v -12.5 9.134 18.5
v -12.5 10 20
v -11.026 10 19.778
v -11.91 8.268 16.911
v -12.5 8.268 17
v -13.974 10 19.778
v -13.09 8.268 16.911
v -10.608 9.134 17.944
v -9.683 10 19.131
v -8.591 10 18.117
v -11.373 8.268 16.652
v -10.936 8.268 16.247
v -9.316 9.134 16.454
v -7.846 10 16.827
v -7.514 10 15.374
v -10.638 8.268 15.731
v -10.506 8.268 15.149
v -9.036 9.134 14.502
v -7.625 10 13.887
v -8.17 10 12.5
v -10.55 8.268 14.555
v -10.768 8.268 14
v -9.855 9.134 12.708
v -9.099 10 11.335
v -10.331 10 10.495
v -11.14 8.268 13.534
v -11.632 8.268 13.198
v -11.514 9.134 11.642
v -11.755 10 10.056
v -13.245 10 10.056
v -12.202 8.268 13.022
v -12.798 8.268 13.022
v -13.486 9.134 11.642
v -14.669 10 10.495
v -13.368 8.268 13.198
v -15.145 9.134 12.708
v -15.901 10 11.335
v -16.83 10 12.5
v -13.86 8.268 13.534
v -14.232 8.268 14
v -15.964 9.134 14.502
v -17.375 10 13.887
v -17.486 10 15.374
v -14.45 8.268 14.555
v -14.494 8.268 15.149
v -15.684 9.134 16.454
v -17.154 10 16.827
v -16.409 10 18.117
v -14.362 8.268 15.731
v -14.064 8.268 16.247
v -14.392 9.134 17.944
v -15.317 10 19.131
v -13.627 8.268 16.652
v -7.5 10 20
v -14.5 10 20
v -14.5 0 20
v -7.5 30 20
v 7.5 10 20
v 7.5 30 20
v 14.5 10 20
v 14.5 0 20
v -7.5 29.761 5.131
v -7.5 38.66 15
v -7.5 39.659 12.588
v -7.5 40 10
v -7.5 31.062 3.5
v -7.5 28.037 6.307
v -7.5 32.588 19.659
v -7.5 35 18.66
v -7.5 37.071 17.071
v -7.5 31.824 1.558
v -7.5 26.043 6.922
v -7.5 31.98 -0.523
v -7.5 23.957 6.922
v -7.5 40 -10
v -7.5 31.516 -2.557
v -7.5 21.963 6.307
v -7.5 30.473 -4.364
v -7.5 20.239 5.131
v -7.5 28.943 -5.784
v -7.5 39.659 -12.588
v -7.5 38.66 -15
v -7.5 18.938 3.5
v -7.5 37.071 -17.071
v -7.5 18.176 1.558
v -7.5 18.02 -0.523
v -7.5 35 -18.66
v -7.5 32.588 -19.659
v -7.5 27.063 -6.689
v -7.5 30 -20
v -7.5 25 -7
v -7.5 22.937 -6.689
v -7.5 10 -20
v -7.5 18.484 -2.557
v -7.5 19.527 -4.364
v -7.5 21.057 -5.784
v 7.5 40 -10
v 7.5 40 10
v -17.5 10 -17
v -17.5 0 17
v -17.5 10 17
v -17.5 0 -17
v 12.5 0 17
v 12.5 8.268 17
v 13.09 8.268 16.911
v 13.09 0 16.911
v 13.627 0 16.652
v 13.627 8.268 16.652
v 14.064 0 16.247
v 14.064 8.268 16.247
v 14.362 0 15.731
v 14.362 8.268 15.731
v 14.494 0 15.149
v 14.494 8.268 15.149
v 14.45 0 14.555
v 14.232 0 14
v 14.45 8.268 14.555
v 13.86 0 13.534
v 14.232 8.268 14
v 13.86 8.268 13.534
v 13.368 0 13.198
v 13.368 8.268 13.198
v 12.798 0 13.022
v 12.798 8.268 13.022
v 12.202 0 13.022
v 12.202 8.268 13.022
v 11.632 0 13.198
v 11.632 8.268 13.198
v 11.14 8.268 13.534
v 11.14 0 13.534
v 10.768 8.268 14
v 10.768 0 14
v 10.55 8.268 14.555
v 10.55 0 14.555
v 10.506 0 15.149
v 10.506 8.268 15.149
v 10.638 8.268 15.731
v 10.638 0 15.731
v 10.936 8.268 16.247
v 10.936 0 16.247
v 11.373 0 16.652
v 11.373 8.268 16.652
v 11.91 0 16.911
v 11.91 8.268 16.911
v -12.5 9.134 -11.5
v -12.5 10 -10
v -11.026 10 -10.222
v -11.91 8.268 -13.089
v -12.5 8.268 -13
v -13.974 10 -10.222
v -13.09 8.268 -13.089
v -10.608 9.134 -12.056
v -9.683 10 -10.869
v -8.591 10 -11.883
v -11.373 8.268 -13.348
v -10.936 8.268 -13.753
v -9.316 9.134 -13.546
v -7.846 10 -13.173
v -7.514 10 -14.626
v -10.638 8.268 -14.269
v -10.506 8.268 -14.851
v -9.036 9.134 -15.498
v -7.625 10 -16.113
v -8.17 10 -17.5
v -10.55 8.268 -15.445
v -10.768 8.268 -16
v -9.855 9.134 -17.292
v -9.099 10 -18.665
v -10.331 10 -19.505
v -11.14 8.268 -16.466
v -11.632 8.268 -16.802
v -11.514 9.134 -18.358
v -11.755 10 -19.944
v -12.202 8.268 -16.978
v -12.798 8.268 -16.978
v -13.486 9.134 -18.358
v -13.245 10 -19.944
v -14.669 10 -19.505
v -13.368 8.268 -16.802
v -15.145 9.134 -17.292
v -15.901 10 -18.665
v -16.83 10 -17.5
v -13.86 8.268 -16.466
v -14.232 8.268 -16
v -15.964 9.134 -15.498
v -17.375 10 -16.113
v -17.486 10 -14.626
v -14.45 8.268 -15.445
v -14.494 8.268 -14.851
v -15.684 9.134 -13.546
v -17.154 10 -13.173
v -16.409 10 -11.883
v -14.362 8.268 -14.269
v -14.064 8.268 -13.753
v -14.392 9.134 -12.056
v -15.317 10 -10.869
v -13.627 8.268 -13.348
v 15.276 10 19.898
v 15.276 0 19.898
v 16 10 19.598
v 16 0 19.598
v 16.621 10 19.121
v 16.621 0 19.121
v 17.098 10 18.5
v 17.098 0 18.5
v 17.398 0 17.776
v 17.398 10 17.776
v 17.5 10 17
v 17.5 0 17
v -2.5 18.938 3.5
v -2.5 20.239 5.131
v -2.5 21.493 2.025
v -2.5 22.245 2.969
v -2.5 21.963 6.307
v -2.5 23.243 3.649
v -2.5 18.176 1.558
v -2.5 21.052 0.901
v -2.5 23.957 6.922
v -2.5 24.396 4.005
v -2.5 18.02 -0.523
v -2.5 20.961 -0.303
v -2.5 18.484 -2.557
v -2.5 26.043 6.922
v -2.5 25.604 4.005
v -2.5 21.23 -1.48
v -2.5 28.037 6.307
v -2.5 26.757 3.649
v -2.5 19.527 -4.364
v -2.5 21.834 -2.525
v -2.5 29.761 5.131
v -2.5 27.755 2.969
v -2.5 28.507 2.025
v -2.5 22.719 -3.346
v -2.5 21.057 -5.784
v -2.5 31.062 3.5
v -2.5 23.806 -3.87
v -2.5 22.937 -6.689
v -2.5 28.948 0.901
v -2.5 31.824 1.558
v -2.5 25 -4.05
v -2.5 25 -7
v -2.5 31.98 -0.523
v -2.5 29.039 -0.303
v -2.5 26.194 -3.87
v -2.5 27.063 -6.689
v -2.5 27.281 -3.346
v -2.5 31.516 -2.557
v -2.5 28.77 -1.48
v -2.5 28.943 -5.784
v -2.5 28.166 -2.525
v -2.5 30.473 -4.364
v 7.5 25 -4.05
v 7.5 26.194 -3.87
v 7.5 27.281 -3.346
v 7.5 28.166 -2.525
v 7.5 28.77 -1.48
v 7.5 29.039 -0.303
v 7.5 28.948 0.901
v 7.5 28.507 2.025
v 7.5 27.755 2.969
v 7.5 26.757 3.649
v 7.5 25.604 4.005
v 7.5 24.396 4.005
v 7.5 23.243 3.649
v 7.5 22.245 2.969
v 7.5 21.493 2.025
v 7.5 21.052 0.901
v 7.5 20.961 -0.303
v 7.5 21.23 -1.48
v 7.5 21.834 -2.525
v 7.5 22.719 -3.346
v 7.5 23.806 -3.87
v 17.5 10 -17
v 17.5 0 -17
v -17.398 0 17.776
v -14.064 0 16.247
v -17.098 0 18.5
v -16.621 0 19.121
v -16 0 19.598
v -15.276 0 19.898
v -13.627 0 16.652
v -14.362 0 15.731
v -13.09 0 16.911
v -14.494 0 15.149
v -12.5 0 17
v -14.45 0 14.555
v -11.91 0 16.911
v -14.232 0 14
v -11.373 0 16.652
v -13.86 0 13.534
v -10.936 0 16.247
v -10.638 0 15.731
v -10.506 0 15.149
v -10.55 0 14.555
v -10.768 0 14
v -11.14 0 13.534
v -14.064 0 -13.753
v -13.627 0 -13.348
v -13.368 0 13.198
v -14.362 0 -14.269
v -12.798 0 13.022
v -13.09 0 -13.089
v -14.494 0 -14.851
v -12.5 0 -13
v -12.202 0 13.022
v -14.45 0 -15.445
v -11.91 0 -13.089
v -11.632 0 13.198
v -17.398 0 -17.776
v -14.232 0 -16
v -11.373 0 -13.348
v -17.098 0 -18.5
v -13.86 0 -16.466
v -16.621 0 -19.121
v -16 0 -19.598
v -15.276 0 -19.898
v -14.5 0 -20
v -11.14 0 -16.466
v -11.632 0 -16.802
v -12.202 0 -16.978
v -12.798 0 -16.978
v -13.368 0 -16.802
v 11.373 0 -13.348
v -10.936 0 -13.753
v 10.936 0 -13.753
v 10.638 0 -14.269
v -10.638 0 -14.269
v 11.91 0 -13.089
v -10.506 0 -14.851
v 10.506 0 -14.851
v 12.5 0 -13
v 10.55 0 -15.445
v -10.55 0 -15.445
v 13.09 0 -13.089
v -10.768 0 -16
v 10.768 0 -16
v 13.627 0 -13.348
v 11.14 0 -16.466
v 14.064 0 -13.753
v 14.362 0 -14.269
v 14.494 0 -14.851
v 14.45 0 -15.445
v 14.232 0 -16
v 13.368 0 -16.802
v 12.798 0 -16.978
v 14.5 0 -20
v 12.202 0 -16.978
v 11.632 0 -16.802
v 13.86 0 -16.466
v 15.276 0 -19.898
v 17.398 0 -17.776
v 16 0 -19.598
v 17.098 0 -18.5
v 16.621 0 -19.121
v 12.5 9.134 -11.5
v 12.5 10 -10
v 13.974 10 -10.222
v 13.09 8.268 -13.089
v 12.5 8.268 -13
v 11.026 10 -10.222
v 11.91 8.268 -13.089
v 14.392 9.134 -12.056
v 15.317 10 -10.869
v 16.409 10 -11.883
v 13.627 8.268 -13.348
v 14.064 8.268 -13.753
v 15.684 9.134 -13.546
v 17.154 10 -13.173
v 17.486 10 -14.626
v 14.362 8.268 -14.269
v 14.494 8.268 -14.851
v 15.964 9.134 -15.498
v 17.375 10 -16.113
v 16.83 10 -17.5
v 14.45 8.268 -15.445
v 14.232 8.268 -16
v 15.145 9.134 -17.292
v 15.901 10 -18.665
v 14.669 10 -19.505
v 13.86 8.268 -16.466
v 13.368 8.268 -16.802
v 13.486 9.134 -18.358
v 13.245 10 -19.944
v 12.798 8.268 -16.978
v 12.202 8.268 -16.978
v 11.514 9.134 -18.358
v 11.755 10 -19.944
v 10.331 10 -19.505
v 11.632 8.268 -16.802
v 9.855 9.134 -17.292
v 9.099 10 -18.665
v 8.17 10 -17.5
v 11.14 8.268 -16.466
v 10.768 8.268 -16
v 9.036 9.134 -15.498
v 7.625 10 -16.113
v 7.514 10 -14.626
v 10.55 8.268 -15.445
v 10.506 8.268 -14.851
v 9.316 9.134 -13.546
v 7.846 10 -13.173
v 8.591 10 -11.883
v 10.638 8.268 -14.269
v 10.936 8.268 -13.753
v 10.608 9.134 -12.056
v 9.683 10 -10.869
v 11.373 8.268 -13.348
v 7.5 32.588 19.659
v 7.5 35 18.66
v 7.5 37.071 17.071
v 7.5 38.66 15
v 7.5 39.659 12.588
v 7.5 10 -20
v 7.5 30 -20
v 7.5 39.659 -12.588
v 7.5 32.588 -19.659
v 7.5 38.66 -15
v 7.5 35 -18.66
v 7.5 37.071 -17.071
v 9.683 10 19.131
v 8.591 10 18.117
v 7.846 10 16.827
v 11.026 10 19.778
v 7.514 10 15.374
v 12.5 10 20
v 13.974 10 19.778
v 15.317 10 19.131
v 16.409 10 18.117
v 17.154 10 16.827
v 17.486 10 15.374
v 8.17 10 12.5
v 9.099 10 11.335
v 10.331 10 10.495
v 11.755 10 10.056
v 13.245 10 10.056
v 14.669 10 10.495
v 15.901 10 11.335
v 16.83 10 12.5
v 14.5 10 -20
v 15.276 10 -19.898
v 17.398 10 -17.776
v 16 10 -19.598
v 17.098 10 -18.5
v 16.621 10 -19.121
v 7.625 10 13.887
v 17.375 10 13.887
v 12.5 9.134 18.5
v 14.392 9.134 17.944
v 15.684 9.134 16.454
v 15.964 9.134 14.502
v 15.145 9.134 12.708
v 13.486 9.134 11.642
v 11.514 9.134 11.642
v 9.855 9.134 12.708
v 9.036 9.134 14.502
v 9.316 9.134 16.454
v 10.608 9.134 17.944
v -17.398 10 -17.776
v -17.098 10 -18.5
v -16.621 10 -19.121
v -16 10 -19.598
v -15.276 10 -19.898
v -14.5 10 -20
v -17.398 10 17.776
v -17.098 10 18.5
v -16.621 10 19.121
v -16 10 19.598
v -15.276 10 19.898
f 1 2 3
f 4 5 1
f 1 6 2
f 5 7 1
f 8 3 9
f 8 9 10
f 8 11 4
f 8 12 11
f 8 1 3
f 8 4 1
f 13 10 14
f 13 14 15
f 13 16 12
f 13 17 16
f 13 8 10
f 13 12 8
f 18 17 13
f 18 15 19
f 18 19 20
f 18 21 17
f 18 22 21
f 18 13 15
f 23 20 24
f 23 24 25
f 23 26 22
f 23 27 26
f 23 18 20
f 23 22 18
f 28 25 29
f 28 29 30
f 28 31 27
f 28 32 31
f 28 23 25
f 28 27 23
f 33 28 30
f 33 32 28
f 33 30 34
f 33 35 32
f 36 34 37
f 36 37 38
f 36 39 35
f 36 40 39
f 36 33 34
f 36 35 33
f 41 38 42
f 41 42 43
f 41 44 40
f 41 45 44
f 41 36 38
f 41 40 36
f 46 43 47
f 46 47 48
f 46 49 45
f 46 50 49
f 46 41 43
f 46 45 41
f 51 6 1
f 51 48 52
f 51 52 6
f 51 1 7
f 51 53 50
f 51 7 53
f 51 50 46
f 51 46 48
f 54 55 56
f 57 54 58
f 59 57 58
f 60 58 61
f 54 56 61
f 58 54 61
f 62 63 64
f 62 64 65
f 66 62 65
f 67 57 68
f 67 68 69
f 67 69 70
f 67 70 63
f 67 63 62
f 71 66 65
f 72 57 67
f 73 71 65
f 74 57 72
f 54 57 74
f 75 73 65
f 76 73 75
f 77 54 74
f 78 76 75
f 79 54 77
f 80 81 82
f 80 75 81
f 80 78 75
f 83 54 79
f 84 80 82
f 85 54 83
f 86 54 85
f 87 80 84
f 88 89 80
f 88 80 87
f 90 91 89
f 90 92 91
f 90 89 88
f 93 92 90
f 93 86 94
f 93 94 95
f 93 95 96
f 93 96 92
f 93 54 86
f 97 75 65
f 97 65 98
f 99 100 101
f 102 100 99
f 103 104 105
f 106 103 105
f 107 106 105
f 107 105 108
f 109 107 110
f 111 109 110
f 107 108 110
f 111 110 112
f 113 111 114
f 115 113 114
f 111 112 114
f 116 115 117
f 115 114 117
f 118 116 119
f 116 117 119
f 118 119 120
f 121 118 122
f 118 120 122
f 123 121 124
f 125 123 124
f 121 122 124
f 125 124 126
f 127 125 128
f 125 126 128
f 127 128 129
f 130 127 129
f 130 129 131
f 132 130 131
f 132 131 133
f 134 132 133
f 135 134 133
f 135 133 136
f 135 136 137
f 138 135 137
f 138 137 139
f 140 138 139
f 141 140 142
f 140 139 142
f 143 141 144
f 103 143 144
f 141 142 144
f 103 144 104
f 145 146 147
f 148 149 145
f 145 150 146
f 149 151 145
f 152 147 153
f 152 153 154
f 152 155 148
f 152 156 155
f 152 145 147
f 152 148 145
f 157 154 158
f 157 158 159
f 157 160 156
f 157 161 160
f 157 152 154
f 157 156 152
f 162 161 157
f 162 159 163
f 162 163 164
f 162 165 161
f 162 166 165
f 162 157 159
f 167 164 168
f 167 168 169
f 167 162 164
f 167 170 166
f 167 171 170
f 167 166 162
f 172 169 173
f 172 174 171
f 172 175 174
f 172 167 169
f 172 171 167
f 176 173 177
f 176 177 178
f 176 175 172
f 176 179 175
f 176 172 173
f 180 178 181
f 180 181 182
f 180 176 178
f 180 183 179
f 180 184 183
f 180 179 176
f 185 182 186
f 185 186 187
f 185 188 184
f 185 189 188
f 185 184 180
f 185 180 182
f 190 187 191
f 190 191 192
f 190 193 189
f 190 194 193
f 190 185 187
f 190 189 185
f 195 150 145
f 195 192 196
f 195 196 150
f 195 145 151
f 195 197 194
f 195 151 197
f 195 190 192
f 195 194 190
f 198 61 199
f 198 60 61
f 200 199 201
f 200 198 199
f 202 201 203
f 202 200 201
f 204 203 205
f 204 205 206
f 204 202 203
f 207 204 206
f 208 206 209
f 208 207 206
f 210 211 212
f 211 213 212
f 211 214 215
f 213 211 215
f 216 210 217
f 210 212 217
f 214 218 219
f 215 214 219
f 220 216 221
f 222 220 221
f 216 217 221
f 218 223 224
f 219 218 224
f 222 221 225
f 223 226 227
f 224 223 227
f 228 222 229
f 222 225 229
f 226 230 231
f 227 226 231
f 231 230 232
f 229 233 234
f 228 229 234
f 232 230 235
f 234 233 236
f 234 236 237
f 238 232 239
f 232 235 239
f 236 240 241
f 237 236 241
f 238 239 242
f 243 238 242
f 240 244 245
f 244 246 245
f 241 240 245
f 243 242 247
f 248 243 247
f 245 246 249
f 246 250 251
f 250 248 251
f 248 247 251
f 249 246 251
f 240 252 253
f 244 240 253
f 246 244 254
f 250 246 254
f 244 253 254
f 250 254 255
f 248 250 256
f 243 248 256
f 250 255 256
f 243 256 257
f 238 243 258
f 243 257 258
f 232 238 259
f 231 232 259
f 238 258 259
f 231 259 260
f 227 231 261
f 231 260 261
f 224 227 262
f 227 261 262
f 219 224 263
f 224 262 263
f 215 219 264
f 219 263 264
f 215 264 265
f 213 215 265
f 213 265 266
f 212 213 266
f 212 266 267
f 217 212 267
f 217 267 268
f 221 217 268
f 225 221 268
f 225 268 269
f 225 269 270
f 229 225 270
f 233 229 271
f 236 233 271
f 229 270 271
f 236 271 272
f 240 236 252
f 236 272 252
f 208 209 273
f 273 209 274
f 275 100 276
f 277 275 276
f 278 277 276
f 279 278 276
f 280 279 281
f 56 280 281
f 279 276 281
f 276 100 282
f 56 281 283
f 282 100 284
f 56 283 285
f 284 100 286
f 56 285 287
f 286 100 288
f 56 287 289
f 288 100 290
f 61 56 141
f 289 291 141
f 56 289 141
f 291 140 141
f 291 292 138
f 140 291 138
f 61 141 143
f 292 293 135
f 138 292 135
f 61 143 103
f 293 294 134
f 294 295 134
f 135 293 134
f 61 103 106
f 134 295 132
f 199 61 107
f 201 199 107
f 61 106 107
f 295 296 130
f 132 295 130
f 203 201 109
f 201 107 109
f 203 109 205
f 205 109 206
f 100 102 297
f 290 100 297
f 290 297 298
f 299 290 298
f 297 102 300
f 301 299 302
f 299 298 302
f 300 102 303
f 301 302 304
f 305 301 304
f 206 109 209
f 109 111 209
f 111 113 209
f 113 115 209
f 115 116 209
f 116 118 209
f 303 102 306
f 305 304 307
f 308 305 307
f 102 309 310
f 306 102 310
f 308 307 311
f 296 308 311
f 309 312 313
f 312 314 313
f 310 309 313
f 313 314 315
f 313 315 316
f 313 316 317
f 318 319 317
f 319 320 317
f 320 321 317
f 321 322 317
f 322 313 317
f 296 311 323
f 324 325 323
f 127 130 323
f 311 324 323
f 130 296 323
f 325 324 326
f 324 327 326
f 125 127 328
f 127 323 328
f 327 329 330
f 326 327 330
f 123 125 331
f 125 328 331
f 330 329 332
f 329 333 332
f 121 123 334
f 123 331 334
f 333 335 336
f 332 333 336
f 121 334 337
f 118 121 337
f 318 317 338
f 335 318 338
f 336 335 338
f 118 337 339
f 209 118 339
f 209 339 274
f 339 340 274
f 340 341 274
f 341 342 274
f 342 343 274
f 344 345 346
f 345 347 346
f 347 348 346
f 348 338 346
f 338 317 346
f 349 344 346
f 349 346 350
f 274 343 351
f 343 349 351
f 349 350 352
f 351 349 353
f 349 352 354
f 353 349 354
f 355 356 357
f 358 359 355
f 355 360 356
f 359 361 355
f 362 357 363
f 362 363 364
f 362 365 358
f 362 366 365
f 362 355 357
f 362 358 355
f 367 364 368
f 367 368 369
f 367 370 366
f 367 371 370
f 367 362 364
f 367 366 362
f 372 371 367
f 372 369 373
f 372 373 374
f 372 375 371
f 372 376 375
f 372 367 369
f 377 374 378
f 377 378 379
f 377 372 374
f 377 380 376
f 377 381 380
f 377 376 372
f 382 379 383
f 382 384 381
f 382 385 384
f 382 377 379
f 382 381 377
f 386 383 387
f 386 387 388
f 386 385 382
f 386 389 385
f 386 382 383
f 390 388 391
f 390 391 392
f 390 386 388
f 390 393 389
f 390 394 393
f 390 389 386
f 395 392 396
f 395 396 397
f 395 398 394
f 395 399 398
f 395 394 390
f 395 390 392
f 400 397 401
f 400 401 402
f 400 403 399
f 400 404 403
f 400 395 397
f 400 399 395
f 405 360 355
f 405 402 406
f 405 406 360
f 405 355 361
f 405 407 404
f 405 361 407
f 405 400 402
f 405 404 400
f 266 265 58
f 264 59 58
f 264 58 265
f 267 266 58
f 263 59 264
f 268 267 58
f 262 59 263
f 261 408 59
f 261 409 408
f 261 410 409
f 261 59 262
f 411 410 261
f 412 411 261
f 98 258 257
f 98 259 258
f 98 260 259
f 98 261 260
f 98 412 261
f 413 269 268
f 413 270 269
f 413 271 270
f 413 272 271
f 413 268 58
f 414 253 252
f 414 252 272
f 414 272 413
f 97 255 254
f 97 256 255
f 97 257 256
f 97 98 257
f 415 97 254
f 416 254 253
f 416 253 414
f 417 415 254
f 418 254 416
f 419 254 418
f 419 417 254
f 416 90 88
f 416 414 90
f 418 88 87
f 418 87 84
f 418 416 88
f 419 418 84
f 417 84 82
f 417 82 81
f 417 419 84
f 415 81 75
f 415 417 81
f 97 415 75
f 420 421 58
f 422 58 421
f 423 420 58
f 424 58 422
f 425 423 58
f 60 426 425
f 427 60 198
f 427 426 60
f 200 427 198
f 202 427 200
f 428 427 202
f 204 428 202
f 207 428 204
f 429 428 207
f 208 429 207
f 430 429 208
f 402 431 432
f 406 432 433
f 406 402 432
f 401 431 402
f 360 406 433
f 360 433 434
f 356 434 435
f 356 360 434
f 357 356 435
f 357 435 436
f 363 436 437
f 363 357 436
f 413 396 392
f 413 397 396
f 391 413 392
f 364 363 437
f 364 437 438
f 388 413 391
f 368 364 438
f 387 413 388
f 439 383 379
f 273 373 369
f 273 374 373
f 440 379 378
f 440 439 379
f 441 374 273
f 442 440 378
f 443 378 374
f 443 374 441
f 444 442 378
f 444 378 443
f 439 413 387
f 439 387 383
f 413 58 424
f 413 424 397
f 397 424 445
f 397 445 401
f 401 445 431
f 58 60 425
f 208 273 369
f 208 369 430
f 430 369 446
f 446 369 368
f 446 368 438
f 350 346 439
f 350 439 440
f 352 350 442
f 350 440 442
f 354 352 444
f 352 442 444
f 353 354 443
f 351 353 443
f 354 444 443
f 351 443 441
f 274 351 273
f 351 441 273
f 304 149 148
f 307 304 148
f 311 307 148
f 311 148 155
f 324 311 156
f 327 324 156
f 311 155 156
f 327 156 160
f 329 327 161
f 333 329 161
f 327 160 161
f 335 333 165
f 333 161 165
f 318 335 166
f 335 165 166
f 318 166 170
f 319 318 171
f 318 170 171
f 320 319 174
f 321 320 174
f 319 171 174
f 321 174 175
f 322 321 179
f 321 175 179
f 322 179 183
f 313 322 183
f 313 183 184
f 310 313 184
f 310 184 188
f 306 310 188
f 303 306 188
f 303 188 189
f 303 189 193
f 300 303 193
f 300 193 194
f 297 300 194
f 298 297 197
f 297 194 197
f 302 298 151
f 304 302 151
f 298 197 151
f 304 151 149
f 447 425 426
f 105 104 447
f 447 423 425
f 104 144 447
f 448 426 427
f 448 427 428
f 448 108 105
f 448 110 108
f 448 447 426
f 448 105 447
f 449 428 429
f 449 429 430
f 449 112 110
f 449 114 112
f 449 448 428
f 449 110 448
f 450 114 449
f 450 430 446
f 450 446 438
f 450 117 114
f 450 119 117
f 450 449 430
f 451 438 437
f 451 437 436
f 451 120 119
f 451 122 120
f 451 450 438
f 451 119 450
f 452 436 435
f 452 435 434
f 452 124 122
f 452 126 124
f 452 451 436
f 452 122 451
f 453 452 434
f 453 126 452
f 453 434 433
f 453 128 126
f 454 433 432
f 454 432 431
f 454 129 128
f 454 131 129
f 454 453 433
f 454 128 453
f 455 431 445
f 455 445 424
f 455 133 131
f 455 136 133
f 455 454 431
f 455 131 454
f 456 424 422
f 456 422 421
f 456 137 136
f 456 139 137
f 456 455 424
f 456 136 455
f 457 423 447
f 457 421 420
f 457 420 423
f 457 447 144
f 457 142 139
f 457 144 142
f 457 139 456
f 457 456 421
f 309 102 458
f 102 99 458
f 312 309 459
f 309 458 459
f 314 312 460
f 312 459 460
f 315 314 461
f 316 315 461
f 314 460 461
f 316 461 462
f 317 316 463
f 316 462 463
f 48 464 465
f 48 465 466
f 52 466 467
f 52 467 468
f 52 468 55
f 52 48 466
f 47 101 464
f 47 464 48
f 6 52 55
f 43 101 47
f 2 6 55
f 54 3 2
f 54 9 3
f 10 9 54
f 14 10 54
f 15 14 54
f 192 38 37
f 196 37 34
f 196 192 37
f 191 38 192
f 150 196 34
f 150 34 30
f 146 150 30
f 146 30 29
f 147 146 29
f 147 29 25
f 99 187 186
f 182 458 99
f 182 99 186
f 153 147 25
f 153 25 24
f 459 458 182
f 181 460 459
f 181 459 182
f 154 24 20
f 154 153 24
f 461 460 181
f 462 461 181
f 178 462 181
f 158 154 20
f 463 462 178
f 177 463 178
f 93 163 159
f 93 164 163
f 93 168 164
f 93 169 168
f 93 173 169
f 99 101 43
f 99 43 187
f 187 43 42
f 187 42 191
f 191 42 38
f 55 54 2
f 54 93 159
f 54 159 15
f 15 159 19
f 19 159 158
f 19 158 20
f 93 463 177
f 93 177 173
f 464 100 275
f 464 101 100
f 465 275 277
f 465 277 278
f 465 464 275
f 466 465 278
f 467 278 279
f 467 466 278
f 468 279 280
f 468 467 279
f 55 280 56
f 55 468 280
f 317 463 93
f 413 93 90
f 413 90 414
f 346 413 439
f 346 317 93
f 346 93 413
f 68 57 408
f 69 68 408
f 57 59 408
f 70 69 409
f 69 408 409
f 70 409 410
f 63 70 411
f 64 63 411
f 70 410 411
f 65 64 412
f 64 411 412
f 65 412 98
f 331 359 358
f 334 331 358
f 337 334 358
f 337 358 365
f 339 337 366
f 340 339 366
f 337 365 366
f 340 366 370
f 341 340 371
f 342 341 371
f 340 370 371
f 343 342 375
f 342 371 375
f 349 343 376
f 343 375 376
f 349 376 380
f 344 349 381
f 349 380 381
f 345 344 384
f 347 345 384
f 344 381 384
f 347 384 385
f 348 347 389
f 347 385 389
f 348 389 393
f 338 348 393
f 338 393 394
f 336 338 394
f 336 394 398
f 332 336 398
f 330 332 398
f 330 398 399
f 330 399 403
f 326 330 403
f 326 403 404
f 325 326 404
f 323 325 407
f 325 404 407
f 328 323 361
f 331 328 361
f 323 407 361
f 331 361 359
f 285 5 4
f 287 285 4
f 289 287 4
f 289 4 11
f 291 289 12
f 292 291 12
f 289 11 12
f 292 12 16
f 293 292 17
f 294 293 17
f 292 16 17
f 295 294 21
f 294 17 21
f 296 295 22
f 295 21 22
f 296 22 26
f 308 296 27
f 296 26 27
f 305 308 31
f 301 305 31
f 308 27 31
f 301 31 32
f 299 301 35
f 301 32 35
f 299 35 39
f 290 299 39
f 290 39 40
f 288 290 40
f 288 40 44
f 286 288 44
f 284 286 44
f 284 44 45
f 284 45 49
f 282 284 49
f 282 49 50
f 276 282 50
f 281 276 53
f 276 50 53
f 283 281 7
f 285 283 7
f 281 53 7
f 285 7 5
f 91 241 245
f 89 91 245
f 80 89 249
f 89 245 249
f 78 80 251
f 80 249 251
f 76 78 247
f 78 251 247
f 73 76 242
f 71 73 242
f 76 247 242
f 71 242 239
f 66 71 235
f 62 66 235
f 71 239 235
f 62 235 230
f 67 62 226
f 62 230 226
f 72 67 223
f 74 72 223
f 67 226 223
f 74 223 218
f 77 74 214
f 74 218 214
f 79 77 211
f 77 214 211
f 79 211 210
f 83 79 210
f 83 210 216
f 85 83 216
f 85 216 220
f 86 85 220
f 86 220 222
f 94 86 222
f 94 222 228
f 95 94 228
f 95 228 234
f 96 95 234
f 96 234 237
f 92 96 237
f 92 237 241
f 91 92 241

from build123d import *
from OCP.BRepFilletAPI import BRepFilletAPI_MakeChamfer

# Parameters (mm, degrees)
SKETCH_2_W          = 35
SKETCH_2_H          = 40
EXTRUDE_1_DEPTH     = 10
SKETCH_3_R          = 2
CUT_EXTRUDE_2_DEPTH = 10
SKETCH_4_W          = 15
SKETCH_4_H          = 40
EXTRUDE_2_DEPTH     = 30
SKETCH_5_R          = 7
CUT_EXTRUDE_3_DEPTH = 52.23475383
FILLET_2_R          = 3
FILLET_3_R          = 10
CHAMFER_1_SIZE      = 3
CHAMFER_1_SIZE_2    = 1.732050808
SKETCH_6_R          = 7
SKETCH_6_R_2        = 4.05
EXTRUDE_3_DEPTH     = 10


with BuildPart() as part:
    # 草图2 → 凸台-拉伸1 (new body)
    with BuildSketch(Plane(origin=(0, 0, 0), x_dir=(1, 0, 0), z_dir=(0, 1, 0))):
        Rectangle(SKETCH_2_W, SKETCH_2_H)
    extrude(amount=EXTRUDE_1_DEPTH)

    # 草图3 → 切除-拉伸2 (cut)
    with BuildSketch(Plane(origin=(0, 10, 0), x_dir=(1, 0, 0), z_dir=(0, 1, 0))):
        with Locations(Location((12.5, 15, 0), (0, 0, 270))):
            Circle(SKETCH_3_R)
        with Locations(Location((-12.5, 15, 0), (0, 0, 270))):
            Circle(SKETCH_3_R)
        with Locations(Location((-12.5, -15, 0), (0, 0, 270))):
            Circle(SKETCH_3_R)
        with Locations(Location((12.5, -15, 0), (0, 0, 270))):
            Circle(SKETCH_3_R)
    extrude(amount=-CUT_EXTRUDE_2_DEPTH, mode=Mode.SUBTRACT)

    # 草图4 → 凸台-拉伸2 (add)
    with BuildSketch(Plane(origin=(0, 10, 0), x_dir=(1, 0, 0), z_dir=(0, 1, 0))):
        Rectangle(SKETCH_4_W, SKETCH_4_H)
    extrude(amount=EXTRUDE_2_DEPTH)

    # 草图5 → 切除-拉伸3 (cut, through all)
    with BuildSketch(Plane(origin=(7.5, 0, 0), x_dir=(0, 0, -1), z_dir=(1, 0, 0))):
        with Locations((0, 25)):
            Circle(SKETCH_5_R)
    extrude(amount=-CUT_EXTRUDE_3_DEPTH, mode=Mode.SUBTRACT)

    # 圆角2
    fillet_2_edges = [part.edges().sort_by_distance(p)[0] for p in [
        (17.5, 5, -20),
        (-17.5, 5, -20),
        (-17.5, 5, 20),
        (17.5, 5, 20),
    ]]
    fillet(fillet_2_edges, radius=FILLET_2_R)

    # 圆角3
    fillet_3_edges = [part.edges().sort_by_distance(p)[0] for p in [
        (0, 40, 20),
        (0, 40, -20),
    ]]
    fillet(fillet_3_edges, radius=FILLET_3_R)

    # 倒角1
    chamfer_1_edges_1 = [part.edges().sort_by_distance(p)[0] for p in [
        (-12.5, 10, -17),
    ]]
    chamfer_1_side_1 = [part.faces().sort_by_distance(p)[0] for p in [
        (-12.5, 10, -17.034641016),
    ]]
    chamfer_1_edges_2 = [part.edges().sort_by_distance(p)[0] for p in [
        (-12.5, 10, 13),
    ]]
    chamfer_1_side_2 = [part.faces().sort_by_distance(p)[0] for p in [
        (-12.5, 10, 12.965358984),
    ]]
    chamfer_1_edges_3 = [part.edges().sort_by_distance(p)[0] for p in [
        (12.5, 10, 13),
    ]]
    chamfer_1_side_3 = [part.faces().sort_by_distance(p)[0] for p in [
        (12.5, 10, 12.965358984),
    ]]
    chamfer_1_edges_4 = [part.edges().sort_by_distance(p)[0] for p in [
        (12.5, 10, -17),
    ]]
    chamfer_1_side_4 = [part.faces().sort_by_distance(p)[0] for p in [
        (12.5, 10, -17.034641016),
    ]]
    chamfer_1 = BRepFilletAPI_MakeChamfer(part.part.solid().wrapped)
    for e in chamfer_1_edges_1:
        chamfer_1.Add(CHAMFER_1_SIZE - 0.0001, CHAMFER_1_SIZE_2 - 0.0001, e.wrapped, chamfer_1_side_1[0].wrapped)
    for e in chamfer_1_edges_2:
        chamfer_1.Add(CHAMFER_1_SIZE - 0.0001, CHAMFER_1_SIZE_2 - 0.0001, e.wrapped, chamfer_1_side_2[0].wrapped)
    for e in chamfer_1_edges_3:
        chamfer_1.Add(CHAMFER_1_SIZE - 0.0001, CHAMFER_1_SIZE_2 - 0.0001, e.wrapped, chamfer_1_side_3[0].wrapped)
    for e in chamfer_1_edges_4:
        chamfer_1.Add(CHAMFER_1_SIZE - 0.0001, CHAMFER_1_SIZE_2 - 0.0001, e.wrapped, chamfer_1_side_4[0].wrapped)
    add(Compound.cast(chamfer_1.Shape()), mode=Mode.REPLACE)  # a hair under: the kernel refuses the full size

    # 草图6 → 凸台-拉伸3 (add)
    with BuildSketch(Plane(origin=(7.5, 0, 0), x_dir=(0, 0, -1), z_dir=(1, 0, 0))):
        with Locations((0, 25)):
            Circle(SKETCH_6_R)
        with Locations((0, 25)):
            Circle(SKETCH_6_R_2, mode=Mode.SUBTRACT)
    extrude(amount=-EXTRUDE_3_DEPTH)


solid = part.part
